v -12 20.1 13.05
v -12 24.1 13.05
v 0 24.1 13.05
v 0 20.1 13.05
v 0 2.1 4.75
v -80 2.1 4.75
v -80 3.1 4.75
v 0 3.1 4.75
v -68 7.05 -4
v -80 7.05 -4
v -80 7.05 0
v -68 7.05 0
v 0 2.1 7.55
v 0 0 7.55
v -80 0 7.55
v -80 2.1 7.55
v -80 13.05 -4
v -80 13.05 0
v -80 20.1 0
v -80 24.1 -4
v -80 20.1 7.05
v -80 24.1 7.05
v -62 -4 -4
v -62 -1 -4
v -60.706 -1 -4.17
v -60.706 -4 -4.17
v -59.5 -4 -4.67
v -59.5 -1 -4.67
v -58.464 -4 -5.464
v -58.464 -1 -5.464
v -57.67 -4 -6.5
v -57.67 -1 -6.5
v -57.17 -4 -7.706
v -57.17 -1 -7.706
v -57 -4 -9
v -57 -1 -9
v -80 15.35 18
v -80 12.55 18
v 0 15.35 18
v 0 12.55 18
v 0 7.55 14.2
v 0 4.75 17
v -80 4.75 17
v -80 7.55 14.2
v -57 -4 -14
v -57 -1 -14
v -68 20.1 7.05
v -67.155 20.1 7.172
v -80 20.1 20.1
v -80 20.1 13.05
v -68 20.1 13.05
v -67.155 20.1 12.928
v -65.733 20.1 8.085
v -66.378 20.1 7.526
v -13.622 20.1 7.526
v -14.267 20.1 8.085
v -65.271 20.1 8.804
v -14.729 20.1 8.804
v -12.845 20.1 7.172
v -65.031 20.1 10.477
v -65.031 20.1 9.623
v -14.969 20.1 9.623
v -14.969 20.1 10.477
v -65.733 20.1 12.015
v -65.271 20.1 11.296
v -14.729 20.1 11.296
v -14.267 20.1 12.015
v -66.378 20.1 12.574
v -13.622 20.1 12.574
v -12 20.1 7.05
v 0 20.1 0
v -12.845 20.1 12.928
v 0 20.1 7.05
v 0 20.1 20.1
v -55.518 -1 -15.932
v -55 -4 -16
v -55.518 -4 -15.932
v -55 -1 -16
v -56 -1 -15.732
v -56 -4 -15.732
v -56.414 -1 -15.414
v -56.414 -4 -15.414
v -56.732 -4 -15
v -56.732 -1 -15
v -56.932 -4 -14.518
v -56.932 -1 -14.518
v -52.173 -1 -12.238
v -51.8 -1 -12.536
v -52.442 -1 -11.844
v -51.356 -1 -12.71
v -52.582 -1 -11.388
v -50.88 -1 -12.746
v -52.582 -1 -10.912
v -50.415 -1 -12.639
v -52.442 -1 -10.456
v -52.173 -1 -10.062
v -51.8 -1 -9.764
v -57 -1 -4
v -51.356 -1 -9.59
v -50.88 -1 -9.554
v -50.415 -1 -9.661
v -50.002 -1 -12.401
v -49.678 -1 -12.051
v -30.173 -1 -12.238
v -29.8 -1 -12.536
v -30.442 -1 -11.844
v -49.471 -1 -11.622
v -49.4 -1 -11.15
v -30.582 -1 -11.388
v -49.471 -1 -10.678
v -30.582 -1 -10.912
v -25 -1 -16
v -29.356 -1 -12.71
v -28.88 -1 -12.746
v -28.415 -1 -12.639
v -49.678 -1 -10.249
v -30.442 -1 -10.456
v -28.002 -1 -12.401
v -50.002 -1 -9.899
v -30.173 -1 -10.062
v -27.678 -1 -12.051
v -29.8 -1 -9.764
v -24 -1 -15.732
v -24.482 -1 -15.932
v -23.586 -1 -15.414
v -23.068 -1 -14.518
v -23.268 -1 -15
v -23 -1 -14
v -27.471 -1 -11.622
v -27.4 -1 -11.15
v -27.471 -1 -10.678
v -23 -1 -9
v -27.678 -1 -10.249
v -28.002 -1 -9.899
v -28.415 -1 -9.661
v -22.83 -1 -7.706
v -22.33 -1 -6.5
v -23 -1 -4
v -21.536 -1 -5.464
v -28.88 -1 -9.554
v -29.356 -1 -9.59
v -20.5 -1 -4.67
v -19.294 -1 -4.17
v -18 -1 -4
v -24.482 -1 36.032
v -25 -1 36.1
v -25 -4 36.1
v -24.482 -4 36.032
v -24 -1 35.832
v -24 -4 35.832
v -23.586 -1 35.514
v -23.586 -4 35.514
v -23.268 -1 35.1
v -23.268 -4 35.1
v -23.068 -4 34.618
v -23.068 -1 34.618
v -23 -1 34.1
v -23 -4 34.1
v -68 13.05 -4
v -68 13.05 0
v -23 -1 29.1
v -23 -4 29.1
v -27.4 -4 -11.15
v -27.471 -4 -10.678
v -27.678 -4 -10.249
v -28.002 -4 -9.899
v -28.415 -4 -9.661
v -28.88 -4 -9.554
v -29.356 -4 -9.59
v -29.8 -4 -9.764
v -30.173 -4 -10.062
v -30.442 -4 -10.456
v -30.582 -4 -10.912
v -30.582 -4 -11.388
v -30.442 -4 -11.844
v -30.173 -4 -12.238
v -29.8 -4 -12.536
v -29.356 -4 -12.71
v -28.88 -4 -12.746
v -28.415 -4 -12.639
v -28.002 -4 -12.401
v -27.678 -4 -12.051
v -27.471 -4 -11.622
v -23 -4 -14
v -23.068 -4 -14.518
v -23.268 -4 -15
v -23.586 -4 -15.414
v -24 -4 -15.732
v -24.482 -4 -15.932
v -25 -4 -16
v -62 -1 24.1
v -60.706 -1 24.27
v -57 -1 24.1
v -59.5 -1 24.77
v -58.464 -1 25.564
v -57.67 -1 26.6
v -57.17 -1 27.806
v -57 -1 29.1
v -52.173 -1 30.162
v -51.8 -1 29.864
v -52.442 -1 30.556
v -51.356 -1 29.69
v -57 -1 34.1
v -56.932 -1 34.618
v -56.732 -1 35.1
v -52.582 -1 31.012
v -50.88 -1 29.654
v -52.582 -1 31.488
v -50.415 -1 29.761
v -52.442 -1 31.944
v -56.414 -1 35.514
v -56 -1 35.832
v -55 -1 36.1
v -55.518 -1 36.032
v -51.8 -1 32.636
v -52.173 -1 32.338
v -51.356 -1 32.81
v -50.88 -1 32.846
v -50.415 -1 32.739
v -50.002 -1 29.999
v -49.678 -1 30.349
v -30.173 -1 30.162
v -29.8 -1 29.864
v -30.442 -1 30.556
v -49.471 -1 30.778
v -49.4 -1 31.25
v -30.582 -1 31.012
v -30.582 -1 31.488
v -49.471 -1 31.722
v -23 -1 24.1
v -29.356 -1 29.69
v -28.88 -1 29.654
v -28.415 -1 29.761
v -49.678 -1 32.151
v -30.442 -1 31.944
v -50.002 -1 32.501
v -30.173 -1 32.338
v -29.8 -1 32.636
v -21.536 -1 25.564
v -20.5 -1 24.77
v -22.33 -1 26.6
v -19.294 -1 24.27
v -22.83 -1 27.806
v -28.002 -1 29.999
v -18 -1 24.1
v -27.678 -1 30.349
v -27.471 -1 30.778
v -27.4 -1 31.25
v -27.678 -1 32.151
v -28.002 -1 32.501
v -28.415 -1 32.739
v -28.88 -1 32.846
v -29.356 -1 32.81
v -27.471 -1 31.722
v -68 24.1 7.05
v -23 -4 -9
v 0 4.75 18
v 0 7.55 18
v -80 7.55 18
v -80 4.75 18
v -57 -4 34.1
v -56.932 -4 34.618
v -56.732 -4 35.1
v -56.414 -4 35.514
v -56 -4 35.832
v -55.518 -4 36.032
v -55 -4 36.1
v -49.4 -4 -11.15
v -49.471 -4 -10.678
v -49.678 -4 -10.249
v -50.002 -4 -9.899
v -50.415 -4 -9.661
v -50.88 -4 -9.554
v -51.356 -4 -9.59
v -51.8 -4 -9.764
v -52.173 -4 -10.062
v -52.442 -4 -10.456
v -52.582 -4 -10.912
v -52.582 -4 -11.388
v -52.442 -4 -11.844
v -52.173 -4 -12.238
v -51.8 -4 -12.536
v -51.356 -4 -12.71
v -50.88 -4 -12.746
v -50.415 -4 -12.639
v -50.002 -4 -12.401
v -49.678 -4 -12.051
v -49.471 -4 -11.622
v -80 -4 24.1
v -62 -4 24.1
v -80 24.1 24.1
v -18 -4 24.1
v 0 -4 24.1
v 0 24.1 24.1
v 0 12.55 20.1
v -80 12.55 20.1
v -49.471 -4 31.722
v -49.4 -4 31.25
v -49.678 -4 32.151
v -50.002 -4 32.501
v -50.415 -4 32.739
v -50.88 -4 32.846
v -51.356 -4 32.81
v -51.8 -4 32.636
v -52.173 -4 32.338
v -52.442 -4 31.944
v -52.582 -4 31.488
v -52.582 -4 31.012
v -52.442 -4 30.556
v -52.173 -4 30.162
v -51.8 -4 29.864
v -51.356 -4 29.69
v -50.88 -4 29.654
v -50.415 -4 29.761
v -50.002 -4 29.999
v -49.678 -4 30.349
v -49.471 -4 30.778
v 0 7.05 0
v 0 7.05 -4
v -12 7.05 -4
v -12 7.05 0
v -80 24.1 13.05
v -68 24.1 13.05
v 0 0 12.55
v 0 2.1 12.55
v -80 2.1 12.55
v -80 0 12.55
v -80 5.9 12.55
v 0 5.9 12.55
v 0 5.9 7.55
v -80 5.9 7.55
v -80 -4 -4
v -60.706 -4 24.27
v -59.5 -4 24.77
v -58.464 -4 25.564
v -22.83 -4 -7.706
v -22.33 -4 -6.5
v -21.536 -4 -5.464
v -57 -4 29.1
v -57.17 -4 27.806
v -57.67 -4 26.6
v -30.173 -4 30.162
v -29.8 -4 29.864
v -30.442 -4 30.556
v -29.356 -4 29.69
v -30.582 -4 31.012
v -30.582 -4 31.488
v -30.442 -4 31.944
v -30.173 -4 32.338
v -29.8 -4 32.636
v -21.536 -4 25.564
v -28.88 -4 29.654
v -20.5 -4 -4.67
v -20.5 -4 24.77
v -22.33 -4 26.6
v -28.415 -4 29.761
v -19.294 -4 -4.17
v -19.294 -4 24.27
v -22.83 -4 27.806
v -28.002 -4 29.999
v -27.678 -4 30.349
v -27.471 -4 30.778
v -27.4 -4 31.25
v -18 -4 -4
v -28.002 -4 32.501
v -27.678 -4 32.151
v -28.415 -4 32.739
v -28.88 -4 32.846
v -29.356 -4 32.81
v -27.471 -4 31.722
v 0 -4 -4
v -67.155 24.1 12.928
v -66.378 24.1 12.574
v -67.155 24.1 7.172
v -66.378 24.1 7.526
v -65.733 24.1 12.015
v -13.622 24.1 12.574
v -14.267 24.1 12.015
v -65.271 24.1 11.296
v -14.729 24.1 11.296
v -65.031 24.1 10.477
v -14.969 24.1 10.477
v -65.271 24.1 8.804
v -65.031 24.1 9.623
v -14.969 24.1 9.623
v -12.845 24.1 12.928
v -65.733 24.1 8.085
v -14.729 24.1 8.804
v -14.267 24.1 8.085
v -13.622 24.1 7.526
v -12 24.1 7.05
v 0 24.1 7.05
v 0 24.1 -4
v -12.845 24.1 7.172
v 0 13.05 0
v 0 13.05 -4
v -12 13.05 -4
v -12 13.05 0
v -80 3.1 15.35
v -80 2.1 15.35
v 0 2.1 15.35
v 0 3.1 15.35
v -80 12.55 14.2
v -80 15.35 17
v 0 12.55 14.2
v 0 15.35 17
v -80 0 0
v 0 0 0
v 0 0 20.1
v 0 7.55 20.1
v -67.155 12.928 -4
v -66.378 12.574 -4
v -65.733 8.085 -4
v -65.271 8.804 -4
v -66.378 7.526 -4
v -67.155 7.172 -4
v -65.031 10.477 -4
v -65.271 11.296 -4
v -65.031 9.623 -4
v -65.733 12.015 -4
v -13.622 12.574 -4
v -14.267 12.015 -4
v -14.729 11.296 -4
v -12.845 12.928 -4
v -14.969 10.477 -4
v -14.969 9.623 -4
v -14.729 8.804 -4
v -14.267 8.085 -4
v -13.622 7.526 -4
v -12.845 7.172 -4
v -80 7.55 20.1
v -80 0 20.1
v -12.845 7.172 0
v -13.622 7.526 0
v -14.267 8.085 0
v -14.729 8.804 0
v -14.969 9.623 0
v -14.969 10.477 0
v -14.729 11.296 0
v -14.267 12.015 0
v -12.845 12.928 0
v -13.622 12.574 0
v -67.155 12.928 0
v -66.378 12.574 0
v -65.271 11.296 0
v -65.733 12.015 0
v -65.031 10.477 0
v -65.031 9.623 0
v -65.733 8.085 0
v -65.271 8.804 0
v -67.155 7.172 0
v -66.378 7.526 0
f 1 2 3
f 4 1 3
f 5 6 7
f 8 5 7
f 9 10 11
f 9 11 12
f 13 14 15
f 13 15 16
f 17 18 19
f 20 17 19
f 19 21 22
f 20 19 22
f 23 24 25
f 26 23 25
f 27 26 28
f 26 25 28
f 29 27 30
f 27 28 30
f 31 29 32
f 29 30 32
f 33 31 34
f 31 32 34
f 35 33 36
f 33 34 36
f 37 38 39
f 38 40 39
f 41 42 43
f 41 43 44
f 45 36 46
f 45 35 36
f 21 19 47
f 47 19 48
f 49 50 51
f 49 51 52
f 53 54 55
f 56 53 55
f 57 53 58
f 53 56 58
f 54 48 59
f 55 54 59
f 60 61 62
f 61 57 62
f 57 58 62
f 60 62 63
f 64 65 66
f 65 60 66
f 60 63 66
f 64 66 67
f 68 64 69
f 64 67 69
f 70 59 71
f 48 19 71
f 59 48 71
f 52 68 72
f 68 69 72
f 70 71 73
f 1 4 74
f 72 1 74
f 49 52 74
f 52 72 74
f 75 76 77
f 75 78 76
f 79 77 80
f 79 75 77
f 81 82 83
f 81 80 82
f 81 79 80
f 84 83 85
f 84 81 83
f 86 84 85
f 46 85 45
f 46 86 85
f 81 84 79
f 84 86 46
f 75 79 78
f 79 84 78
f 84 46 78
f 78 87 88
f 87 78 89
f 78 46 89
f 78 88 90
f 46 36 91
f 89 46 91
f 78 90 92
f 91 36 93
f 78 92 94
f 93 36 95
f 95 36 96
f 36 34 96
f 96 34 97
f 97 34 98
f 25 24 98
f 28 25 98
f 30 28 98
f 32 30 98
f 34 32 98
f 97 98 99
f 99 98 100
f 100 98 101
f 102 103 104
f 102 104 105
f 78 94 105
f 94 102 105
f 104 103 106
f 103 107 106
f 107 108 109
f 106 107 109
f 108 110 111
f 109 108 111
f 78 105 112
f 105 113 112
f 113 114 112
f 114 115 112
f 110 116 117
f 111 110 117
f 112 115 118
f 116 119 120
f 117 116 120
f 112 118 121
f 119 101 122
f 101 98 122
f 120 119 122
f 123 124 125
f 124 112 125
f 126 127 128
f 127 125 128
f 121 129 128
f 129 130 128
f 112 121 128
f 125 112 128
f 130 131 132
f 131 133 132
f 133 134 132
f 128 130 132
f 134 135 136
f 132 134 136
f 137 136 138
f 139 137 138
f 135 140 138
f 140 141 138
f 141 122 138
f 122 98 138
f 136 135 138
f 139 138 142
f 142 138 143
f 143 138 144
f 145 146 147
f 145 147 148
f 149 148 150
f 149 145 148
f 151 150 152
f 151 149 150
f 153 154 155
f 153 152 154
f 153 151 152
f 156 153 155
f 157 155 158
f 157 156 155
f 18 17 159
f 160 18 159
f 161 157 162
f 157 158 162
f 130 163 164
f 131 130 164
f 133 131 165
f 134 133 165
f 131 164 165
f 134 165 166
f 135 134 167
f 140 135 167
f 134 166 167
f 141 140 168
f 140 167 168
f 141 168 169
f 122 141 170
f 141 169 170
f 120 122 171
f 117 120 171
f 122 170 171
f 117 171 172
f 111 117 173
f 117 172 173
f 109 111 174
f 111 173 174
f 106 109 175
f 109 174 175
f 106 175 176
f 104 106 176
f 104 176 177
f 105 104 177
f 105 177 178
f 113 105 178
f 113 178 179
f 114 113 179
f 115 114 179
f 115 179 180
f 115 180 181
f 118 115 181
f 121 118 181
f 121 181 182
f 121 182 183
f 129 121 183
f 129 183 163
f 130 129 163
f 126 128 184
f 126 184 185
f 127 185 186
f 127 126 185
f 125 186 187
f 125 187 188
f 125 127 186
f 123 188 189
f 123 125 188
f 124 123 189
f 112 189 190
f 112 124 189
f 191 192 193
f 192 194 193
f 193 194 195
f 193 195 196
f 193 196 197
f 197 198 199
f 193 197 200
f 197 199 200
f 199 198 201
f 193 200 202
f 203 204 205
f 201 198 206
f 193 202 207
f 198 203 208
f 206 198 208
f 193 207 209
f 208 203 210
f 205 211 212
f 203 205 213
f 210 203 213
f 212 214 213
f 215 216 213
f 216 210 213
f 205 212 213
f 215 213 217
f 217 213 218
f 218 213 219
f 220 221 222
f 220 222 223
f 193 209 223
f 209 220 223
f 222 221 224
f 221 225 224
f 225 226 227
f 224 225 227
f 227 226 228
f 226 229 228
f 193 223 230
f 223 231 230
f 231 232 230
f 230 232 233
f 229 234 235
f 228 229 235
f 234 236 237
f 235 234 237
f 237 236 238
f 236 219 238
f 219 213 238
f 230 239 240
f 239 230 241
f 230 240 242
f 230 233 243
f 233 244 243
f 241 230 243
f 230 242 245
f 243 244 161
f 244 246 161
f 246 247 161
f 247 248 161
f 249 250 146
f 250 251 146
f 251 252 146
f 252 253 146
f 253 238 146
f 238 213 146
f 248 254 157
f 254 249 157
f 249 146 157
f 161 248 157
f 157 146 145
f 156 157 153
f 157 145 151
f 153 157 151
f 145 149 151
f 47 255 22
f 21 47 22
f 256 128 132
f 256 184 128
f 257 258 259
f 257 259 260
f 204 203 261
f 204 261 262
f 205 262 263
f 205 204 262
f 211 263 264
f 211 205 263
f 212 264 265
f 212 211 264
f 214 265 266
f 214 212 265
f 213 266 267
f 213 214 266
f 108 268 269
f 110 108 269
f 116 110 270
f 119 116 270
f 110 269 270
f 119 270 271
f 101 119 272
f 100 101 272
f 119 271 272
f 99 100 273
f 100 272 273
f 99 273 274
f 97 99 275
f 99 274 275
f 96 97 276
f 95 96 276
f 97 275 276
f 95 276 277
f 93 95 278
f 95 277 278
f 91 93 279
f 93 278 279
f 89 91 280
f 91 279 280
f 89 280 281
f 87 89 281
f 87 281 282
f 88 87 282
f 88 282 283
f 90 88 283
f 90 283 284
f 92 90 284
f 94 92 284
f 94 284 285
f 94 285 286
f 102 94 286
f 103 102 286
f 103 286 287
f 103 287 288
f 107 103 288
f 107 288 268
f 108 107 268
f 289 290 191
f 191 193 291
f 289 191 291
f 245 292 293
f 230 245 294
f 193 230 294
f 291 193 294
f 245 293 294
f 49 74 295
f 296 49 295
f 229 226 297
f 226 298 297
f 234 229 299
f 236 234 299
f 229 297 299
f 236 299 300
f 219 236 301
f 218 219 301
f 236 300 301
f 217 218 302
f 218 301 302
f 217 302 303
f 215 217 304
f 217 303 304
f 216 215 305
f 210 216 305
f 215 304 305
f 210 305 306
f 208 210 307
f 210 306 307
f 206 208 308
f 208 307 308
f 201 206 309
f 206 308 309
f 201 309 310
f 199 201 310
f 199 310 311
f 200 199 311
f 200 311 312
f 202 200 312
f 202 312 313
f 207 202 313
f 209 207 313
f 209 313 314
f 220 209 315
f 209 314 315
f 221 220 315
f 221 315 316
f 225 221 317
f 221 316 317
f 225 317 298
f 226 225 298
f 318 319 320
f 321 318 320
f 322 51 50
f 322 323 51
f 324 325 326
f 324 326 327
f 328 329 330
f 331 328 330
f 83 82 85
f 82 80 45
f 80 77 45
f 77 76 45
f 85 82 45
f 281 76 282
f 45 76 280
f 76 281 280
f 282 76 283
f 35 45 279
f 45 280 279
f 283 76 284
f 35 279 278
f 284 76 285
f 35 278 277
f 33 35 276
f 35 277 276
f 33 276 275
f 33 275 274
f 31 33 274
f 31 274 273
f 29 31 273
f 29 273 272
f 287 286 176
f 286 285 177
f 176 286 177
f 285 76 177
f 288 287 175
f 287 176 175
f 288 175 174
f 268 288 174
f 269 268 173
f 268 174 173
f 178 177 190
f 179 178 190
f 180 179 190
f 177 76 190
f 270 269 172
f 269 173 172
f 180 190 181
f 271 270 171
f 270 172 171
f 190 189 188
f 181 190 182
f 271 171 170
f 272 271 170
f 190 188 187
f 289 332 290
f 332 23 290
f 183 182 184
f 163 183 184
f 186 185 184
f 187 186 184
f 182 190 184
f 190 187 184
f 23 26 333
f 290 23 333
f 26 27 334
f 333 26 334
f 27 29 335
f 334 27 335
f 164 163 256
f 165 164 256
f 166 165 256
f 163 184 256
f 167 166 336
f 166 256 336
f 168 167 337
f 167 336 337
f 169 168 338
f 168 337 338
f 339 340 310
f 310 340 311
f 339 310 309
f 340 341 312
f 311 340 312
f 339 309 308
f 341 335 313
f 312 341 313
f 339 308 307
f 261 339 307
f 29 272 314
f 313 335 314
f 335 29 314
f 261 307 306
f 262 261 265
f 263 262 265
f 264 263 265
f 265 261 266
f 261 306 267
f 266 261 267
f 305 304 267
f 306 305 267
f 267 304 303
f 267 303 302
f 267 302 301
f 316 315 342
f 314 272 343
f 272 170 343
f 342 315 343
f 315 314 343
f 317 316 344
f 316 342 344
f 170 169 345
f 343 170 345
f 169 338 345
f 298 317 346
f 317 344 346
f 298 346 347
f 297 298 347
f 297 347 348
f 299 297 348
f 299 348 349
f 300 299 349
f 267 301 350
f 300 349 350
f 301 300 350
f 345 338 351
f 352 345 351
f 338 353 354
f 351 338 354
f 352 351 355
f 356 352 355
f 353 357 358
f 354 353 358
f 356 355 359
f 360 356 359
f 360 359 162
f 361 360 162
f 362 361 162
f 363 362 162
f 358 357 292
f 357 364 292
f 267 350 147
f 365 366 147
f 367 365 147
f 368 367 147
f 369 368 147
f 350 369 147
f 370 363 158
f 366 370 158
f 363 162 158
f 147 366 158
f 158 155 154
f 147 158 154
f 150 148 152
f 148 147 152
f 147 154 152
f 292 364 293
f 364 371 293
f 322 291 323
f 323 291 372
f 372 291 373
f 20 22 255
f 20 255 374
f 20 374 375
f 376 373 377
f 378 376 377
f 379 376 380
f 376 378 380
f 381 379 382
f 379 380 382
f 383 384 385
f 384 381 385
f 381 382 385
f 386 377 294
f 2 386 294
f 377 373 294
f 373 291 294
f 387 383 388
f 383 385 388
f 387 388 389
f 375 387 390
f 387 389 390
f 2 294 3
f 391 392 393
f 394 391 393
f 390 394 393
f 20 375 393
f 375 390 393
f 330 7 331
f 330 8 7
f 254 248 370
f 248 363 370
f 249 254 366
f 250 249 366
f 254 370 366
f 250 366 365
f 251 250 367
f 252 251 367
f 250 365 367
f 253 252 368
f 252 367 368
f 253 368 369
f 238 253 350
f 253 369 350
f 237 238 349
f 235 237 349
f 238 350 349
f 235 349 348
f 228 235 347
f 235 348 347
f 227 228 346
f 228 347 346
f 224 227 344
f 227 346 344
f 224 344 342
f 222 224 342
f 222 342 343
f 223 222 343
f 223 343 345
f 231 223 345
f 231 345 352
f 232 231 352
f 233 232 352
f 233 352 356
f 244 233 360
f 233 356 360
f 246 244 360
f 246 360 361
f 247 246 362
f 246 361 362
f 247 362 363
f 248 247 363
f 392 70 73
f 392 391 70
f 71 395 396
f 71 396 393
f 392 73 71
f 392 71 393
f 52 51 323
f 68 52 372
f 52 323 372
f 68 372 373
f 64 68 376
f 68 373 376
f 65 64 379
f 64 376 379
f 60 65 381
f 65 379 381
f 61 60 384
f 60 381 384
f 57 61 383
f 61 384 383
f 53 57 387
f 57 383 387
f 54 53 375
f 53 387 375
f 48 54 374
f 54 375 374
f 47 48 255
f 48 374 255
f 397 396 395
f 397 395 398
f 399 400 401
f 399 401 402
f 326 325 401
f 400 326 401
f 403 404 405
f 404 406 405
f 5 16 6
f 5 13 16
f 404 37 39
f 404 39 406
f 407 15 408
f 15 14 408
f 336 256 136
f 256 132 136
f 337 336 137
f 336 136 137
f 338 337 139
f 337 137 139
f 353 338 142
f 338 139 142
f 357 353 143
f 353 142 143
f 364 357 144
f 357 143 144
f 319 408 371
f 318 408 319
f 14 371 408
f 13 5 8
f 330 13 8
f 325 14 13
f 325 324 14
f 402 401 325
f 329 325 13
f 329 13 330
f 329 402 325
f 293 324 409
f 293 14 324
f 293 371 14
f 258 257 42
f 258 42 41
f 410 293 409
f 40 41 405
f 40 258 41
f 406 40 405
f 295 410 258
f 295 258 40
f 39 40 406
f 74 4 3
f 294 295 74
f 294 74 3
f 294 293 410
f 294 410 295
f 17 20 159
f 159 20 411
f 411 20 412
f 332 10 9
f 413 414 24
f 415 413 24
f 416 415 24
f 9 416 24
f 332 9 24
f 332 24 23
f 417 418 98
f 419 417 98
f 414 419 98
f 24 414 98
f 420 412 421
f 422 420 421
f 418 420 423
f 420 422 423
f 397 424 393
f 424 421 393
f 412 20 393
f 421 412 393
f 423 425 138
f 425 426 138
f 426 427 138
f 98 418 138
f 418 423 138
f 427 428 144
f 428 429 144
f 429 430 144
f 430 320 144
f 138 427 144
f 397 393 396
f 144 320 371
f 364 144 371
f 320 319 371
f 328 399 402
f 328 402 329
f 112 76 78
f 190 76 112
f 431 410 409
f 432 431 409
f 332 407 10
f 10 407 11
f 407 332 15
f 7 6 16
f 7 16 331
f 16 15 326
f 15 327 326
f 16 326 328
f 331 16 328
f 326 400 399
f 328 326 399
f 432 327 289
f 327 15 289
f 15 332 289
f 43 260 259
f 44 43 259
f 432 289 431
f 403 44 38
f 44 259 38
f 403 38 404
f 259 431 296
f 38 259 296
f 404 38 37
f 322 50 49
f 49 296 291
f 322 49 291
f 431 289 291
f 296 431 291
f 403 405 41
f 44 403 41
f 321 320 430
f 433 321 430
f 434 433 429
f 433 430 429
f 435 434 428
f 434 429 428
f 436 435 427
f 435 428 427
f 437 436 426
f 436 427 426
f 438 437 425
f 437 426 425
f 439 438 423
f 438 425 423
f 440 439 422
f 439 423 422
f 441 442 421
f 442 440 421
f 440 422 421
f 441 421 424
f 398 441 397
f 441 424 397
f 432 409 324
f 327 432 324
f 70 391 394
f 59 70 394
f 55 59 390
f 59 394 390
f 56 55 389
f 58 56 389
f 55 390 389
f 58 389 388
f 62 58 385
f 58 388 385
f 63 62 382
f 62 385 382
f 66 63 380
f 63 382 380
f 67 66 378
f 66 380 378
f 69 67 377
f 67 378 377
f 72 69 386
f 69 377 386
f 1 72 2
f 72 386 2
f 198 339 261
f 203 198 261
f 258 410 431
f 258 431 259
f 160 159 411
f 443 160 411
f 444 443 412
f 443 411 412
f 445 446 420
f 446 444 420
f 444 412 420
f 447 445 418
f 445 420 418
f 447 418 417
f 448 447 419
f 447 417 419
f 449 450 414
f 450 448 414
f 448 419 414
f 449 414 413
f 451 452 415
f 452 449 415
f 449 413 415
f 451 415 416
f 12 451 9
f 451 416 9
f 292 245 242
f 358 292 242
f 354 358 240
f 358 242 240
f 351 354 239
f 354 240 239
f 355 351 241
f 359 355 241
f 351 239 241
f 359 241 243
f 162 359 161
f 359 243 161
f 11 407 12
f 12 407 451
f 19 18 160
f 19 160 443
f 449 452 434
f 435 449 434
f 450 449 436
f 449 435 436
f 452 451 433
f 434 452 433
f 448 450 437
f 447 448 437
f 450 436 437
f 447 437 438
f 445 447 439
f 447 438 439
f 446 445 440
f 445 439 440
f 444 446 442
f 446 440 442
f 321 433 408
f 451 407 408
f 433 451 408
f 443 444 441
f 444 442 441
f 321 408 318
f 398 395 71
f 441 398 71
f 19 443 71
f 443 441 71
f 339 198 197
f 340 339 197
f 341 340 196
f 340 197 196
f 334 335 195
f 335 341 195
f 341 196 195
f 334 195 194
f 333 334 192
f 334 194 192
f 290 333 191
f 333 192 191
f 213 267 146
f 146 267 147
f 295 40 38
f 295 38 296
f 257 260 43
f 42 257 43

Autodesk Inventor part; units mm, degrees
ref_plane "YZ Plane" through (0, 0, 0) normal (1, 0, 0) x (0, 1, 0)
ref_plane "XZ Plane" through (0, 0, 0) normal (0, 1, 0) x (-1, 0, 0)
ref_plane "XY Plane" through (0, 0, 0) normal (0, 0, 1) x (1, 0, 0)
sketch "Sketch1" plane through (0, 0, 0) normal (1, 0, 0) x (0, 1, 0)
  line L0 (0, 0) -> (20.1, 0)
  line L1 (20.1, 0) -> (20.1, 20.1)
  line L2 (20.1, 20.1) -> (0, 20.1)
  line L3 (0, 20.1) -> (0, 0)
  line L4 (-4, 24.1) -> (24.1, 24.1)
  line L5 (24.1, 24.1) -> (24.1, -4)
  line L6 (24.1, -4) -> (-4, -4)
  line L7 (-4, -4) -> (-4, 24.1)
  line L8 (12.55, 22.2) -> (7.55, 22.2)
  line L9 (7.55, 22.2) -> (7.55, 18)
  line L10 (7.55, 18) -> (12.55, 18)
  line L11 (12.55, 18) -> (12.55, 22.2)
  line L12 (12.55, 22.2) -> (7.55, 18) construction
  line L13 (7.55, 22.2) -> (12.55, 18) construction
  line L14 (12.55, 18) -> (15.35, 18)
  line L15 (15.35, 18) -> (15.35, 17)
  line L16 (15.35, 17) -> (12.55, 14.2)
  line L17 (12.55, 14.2) -> (7.55, 14.2)
  line L18 (7.55, 18) -> (4.75, 18)
  line L19 (4.75, 18) -> (4.75, 17)
  line L20 (4.75, 17) -> (7.55, 14.2)
  line L21 (2.1, 15.35) -> (3.1, 15.35)
  line L22 (3.1, 4.75) -> (5.9, 7.55)
  line L23 (2.1, 4.75) -> (3.1, 4.75)
  line L24 (-2.1, 12.55) -> (-2.1, 7.55)
  line L25 (2.1, 12.55) -> (-2.1, 12.55)
  line L26 (-2.1, 12.55) -> (2.1, 7.55) construction
  line L27 (-2.1, 7.55) -> (2.1, 12.55) construction
  line L28 (2.1, 7.55) -> (2.1, 4.75)
  line L29 (-2.1, 7.55) -> (2.1, 7.55)
  line L30 (2.1, 7.55) -> (2.1, 12.55)
  line L31 (5.9, 12.55) -> (5.9, 7.55)
  line L32 (2.1, 12.55) -> (2.1, 15.35)
  line L33 (3.1, 15.35) -> (5.9, 12.55)
  point P0 (10.05, 20.1)
  point P1 (0, 10.05)
  point P2 (10.05, 20.1)
  point P3 (0, 10.05)
  point P4 (0, 7.55)
  point P5 (0, 12.55)
  point P6 (7.55, 20.1)
  point P7 (12.55, 20.1)
  dimension "d0" = 20.1
  dimension "d1" = 20.1
  dimension "d2" = 4
  dimension "d3" = 5
  dimension "d4" = 4.2
  dimension "d5" = 2.8
  dimension "d6" = 1
  dimension "d7" = 3.8
  dimension "d8" = 2.8
  dimension "d9" = 5
  dimension "d10" = 1
  dimension "d11" = 135
  dimension "d12" = 5
  dimension "d13" = 4.2
  dimension "d14" = 2.8
  dimension "d15" = 1
  dimension "d16" = 3.8
  dimension "d17" = 2.8
  dimension "d18" = 5
  dimension "d19" = 1
  dimension "d20" = 135
  dimension "d21" = 7.55
  dimension "d22" = 2.1
  dimension "d23" = 90
  dimension "d24" = 7.55
  dimension "d25" = 2.1
  dimension "d26" = 90
extrude "Extrusion1" add sketch "Sketch1" against normal blind 80 contours L29 L24 L25 L3 | L3 L25 L30 L29 | L30 L32 L21 L33 L31 L22 L23 L28 | L11 L10 L9 L2 | L2 L9 L8 L11 | L14 L15 L16 L17 L20 L19 L18 L10 | L4 L5 L6 L7
sketch "Sketch2" plane through (0, -4, -4) normal (0, -1, 0) x (1, 0, 0)
  line L0 (0, 28.1) -> (0, 0) projected
  line L1 (0, 28.1) -> (-80, 28.1) projected
  line L2 (-80, 0) -> (-80, 28.1) projected
  line L3 (0, 0) -> (-80, 0) projected
  line L4 (-80, 0) -> (0, 28.1) construction
  line L5 (-80, 28.1) -> (0, 0) construction
  line L6 (-51, 35.25) -> (-51, -7.15) construction
  line L7 (-51, -7.15) -> (-29, -7.15) construction
  line L8 (-29, -7.15) -> (-29, 35.25) construction
  line L9 (-29, 35.25) -> (-51, 35.25) construction
  line L10 (-51, 35.25) -> (-29, -7.15) construction
  line L11 (-51, -7.15) -> (-29, 35.25) construction
  circle A0 centre (-29, 35.25) radius 1.6
  circle A1 centre (-29, -7.15) radius 1.6
  circle A2 centre (-51, 35.25) radius 1.6
  circle A3 centre (-51, -7.15) radius 1.6
  line L12 (-23, 28.1) -> (-57, 28.1)
  line L13 (-57, 28.1) -> (-57, 40.1)
  line L14 (-57, 40.1) -> (-23, 40.1)
  line L15 (-23, 40.1) -> (-23, 28.1)
  line L16 (-23, 0) -> (-57, 0)
  line L17 (-57, 0) -> (-57, -12)
  line L18 (-57, -12) -> (-23, -12)
  line L19 (-23, -12) -> (-23, 0)
  point P0 (0, 4)
  point P1 (-40, 14.05)
  dimension "d29" = 42.4
  dimension "d31" = 22
  dimension "d32" = 3.2
  dimension "d35" = 42.4
  dimension "d38" = 22
  dimension "d41" = 34
  dimension "d42" = 12
  dimension "d43" = 6
  dimension "d44" = 12
  dimension "d45" = 6
  dimension "d46" = 34
extrude "Extrusion2" add sketch "Sketch2" against normal blind 3 contours L1 L13 L14 L15 | L19 L18 L17 L3
sketch "Sketch3" plane through (0, 24.1, 24.1) normal (0, 1, 0) x (1, 0, 0)
  line L0 (0, 28.1) -> (0, 0) projected
  line L1 (0, 28.1) -> (-80, 28.1) projected
  line L2 (-80, 0) -> (-80, 28.1) projected
  line L3 (0, 0) -> (-80, 0) projected
  line L4 (0, 16.55) -> (0, 11.55) construction
  line L5 (0, 14.05) -> (-80, 14.05) construction
  line L6 (-80, 28.1) -> (-80, 0) construction
  circle A0 centre (-12, 14.05) radius 3
  circle A1 centre (-68, 14.05) radius 3
  line L7 (-68, 17.05) -> (-80, 17.05)
  line L8 (-68, 11.05) -> (-80, 11.05)
  line L9 (-12, 17.05) -> (0, 17.05)
  line L10 (0, 19.35) -> (0, 16.55) projected
  line L11 (-12, 11.05) -> (0, 11.05)
  line L12 (0, 8.75) -> (0, 11.55) projected
  point P0 (0, 24.1)
  point P1 (0, 11.05)
  point P2 (-80, 11.05)
  dimension "d49" = 6
  dimension "d50" = 6
  dimension "d51" = 12
  dimension "d52" = 12
  dimension "d53" = 6
  dimension "d54" = 6
extrude "Extrusion3" cut sketch "Sketch3" against normal up to surface (4 mm away) contours L0 L11 A0 L9 | L7 A1 L8 L2 | A0 | A1
ref_plane "Work Plane1" through (0, 24.1, -4) normal (0, -0.7071, -0.7071) x (-1, 0, 0)
mirror "Mirror1" about plane through (0, 24.1, -4) normal (0, -0.7071, -0.7071) of "Extrusion3"
fillet "Fillet1" radius 2 4 edges at (-23, -2.5, -16) (-57, -2.5, -16) (-57, -2.5, 36.1) (-23, -2.5, 36.1)
fillet "Fillet2" radius 5 4 edges at (-23, -2.5, -4) (-57, -2.5, -4) (-57, -2.5, 24.1) (-23, -2.5, 24.1)
equation "\"d8\" = d5"
equation "\"d9\" = d3"
equation "\"d10\" = d6"
equation "\"d17\" = d14"
equation "\"d18\" = d12"
equation "\"d19\" = d15"
properties part number "cameraSlider"
